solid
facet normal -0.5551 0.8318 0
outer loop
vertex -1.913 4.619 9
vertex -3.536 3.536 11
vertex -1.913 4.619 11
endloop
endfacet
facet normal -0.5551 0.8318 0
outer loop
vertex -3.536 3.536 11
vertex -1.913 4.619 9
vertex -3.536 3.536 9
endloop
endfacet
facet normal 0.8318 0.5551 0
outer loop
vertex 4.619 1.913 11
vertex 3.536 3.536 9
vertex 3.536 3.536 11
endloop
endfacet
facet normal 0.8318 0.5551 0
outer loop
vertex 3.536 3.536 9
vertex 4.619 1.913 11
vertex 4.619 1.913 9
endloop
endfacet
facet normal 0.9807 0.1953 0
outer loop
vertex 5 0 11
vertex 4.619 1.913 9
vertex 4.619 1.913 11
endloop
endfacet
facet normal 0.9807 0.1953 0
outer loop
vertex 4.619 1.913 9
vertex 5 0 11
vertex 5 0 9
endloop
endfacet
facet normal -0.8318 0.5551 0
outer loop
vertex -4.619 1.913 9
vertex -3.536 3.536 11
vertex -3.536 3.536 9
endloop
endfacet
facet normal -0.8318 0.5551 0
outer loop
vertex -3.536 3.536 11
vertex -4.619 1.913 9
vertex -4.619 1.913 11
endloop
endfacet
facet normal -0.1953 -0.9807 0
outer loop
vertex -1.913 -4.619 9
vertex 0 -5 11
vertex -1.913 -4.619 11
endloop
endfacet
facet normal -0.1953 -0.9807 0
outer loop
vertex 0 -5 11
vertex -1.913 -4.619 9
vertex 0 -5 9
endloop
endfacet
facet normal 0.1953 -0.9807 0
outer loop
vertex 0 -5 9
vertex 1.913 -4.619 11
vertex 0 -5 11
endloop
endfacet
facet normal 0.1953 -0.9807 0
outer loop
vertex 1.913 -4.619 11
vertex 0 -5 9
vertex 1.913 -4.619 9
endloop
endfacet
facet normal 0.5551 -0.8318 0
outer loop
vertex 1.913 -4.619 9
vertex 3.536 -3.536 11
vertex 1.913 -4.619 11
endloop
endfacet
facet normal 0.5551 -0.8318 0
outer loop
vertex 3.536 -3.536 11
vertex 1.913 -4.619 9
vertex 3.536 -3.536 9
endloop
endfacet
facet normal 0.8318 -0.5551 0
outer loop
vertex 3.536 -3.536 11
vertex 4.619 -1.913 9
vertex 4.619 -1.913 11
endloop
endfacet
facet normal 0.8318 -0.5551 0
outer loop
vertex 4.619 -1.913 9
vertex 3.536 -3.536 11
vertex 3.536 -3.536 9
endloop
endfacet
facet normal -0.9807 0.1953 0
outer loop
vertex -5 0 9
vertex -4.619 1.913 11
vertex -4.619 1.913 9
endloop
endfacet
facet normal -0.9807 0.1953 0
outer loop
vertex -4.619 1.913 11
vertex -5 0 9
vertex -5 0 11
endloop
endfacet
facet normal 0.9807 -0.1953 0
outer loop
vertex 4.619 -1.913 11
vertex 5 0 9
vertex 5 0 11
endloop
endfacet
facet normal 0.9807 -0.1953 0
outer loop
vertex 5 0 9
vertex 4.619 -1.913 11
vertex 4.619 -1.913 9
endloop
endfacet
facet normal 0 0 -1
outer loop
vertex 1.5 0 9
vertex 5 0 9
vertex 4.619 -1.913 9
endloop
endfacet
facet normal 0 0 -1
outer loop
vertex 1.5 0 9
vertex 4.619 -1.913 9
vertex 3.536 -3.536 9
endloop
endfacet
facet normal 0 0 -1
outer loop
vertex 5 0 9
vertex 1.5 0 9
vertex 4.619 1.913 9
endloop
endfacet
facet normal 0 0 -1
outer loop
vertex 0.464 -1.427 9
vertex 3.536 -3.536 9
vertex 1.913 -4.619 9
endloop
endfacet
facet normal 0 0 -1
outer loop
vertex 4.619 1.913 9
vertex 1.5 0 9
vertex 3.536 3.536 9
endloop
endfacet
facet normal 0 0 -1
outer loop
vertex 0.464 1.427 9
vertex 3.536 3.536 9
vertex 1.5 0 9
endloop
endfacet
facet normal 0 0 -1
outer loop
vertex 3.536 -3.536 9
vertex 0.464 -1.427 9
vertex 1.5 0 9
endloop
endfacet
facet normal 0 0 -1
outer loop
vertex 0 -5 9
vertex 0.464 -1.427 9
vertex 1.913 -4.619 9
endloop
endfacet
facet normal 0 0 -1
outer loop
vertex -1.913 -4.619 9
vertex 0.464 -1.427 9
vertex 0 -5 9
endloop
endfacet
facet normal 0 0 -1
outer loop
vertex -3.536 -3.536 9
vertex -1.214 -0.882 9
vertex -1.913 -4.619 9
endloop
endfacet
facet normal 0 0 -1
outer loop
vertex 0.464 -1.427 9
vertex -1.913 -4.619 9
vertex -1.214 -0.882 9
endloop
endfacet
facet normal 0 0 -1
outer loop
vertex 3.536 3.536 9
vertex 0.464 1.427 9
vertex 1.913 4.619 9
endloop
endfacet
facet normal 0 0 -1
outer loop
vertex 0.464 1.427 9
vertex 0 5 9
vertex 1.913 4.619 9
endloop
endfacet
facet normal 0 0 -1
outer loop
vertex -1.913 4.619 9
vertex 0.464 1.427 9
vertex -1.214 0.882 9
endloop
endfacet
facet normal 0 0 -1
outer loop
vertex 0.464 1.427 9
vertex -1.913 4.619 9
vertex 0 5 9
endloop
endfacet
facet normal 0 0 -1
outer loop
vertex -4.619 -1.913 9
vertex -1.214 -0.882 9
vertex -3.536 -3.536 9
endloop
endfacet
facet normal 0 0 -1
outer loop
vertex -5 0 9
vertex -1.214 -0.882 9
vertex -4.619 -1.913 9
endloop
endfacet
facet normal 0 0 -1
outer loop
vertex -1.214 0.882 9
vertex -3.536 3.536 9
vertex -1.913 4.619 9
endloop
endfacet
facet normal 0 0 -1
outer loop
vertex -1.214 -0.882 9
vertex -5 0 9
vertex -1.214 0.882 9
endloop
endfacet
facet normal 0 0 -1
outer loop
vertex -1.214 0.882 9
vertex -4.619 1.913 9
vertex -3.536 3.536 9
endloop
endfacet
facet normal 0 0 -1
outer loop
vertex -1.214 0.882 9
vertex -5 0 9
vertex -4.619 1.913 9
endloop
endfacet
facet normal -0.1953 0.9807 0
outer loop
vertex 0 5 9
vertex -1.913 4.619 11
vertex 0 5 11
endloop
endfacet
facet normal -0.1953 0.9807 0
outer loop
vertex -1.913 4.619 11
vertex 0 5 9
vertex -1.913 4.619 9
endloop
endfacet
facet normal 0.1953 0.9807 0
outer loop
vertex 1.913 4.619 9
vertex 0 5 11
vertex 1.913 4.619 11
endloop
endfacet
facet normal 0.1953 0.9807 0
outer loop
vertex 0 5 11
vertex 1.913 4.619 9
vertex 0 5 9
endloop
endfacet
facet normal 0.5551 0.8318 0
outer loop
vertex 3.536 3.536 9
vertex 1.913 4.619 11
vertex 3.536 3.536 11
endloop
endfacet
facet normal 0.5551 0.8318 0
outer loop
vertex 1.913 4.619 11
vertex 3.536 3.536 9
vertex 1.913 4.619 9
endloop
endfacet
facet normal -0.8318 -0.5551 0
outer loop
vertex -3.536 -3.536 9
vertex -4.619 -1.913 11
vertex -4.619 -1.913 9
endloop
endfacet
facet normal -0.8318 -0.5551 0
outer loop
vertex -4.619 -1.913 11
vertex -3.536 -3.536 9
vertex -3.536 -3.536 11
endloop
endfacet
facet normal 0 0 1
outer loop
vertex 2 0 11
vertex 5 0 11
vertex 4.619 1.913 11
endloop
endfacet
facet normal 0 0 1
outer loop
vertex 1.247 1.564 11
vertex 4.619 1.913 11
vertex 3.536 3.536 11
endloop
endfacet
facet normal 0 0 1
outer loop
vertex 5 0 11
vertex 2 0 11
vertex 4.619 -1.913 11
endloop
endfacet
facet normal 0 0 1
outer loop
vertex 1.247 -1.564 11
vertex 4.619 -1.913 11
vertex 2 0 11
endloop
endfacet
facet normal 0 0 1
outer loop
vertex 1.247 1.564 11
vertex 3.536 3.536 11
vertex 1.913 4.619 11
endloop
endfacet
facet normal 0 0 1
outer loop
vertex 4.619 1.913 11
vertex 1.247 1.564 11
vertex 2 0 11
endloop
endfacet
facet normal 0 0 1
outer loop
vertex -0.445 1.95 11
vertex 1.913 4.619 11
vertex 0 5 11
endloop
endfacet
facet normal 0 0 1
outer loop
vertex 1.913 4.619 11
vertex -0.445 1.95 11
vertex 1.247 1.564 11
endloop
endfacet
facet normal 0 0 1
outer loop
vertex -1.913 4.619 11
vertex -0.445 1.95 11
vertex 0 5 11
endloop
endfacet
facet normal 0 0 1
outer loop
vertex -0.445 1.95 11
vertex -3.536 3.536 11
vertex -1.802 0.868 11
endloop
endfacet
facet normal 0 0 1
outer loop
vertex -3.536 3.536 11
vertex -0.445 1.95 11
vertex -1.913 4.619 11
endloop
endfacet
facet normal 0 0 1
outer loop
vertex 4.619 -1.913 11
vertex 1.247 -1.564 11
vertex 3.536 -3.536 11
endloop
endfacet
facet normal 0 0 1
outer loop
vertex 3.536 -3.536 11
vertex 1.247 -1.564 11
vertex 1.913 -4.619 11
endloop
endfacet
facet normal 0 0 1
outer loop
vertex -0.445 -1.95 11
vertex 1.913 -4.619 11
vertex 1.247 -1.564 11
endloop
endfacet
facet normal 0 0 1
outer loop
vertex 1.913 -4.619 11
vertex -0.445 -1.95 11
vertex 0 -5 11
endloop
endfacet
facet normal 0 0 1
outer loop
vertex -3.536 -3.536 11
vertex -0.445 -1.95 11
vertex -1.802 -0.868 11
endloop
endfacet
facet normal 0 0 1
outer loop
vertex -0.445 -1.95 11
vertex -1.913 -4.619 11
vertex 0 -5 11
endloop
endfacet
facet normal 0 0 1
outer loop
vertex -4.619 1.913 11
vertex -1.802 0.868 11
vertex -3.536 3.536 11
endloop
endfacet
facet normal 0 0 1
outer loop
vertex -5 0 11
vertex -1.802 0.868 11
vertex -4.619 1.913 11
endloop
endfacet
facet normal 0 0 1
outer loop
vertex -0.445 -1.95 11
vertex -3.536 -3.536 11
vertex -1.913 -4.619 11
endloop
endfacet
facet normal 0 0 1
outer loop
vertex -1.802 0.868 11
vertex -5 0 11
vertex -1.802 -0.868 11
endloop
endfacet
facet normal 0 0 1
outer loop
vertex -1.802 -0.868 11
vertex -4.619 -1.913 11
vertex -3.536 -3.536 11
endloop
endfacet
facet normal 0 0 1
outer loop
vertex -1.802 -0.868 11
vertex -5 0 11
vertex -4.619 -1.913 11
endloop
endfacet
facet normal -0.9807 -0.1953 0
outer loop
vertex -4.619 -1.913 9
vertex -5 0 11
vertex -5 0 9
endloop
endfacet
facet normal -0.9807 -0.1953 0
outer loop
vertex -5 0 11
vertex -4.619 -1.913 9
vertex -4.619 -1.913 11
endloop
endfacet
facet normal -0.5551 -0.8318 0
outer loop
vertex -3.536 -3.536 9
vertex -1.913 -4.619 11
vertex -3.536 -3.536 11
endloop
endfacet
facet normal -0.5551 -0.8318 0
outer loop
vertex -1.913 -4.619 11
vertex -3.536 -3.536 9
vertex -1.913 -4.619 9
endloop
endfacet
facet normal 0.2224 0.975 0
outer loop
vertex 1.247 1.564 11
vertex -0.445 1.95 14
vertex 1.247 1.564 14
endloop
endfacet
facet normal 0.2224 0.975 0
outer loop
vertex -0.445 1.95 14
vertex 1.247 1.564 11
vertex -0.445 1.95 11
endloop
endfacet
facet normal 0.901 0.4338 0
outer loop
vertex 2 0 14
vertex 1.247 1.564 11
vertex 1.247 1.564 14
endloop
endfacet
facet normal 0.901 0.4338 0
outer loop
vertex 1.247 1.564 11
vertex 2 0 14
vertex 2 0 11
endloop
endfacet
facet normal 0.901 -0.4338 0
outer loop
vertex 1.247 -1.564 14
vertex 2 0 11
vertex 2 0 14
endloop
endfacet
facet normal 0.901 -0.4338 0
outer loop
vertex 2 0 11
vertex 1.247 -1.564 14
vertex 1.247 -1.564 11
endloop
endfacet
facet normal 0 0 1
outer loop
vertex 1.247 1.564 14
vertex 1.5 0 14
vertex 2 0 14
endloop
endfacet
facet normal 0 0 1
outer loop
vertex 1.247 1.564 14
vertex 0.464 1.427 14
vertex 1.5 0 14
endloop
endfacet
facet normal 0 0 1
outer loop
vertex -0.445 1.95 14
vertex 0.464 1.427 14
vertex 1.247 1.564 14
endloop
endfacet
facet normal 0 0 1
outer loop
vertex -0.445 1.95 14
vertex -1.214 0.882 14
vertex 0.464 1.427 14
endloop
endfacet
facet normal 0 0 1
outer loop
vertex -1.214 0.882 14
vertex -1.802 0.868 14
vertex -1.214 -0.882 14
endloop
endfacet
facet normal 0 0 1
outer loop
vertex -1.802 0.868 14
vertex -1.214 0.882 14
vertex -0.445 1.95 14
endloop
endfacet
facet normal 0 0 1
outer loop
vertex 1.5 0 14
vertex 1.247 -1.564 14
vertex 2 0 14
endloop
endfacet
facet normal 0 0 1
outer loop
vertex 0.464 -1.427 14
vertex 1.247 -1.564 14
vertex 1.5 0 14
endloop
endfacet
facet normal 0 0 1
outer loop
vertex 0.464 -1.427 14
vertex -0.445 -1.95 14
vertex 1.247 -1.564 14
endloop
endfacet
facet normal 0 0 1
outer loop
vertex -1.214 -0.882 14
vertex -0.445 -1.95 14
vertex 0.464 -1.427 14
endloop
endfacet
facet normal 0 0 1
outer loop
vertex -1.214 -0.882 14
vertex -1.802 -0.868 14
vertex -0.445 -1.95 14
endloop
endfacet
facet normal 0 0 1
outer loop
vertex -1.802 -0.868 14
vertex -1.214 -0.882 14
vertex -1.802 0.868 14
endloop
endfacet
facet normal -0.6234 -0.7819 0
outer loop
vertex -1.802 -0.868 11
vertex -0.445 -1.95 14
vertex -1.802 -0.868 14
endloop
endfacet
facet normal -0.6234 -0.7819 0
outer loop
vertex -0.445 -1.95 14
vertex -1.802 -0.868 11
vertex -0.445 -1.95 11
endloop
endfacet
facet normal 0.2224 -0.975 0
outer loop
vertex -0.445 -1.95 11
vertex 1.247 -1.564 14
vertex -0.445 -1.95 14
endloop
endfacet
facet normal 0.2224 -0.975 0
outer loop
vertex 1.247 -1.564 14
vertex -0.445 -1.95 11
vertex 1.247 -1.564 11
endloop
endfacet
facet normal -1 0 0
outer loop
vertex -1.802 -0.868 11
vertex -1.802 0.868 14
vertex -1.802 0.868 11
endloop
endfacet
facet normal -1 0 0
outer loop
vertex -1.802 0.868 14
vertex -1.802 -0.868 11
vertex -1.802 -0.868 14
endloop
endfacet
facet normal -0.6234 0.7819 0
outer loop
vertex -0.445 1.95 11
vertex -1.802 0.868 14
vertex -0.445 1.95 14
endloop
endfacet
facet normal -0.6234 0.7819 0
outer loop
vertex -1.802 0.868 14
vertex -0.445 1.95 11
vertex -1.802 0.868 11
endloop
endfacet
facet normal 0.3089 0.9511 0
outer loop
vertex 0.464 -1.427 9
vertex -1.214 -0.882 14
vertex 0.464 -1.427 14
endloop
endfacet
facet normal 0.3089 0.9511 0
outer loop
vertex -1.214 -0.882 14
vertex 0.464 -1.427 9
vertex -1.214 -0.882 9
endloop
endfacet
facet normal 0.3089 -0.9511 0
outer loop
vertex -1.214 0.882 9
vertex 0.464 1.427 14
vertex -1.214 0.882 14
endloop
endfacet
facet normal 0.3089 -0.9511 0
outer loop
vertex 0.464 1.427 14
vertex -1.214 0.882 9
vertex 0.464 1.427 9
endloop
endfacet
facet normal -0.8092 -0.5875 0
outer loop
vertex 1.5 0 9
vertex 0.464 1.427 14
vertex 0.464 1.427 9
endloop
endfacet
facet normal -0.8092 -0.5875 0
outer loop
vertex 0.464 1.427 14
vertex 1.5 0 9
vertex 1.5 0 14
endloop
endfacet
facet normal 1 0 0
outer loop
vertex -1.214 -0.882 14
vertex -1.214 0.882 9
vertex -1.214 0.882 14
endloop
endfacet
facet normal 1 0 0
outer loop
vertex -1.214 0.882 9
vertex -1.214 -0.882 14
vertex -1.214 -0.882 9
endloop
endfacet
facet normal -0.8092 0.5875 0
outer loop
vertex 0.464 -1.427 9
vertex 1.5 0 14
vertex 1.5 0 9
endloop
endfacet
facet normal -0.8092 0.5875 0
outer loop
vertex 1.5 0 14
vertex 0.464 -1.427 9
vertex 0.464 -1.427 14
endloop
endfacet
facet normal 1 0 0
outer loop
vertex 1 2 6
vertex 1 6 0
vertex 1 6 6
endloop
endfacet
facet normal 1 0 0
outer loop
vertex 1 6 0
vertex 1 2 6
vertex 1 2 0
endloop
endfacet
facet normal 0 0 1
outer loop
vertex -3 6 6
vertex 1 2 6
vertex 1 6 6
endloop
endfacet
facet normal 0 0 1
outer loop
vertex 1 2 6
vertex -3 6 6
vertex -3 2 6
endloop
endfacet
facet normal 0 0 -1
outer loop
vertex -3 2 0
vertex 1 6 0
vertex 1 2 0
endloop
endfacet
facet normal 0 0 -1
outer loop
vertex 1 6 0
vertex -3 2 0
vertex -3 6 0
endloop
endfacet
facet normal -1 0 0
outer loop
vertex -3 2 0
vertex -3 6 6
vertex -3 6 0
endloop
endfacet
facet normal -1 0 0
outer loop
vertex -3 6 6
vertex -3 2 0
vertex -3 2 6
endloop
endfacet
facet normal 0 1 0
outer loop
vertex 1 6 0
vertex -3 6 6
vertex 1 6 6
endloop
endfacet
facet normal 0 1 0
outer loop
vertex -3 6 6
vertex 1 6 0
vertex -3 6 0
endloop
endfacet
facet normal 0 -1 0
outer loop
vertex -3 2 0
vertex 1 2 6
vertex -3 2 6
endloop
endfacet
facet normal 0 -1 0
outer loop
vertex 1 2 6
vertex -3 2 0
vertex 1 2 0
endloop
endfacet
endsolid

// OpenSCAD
r3 = sqrt(3)/2*17;  // face of hexagon is 17mm

module nut() {
    linear_extrude(h=10)
    polygon(points=[[2,0],[1,r3],[-1,r3],[-2,0],[-1,-r3],[1,-r3]]);
    
}

linear_extrude(height=6)
scale([2.5,2.5,2.5])
difference(){
nut();
scale(.95)nut();
}

difference(){
    union() {    
    translate([0,0,9]) cylinder(r=5,h=2);
    translate([0,0,9]) cylinder(r=2,h=5);
    }
    cylinder(r=1.5,h=20);
}
translate([-3,2,0])cube([4,4,6]);
